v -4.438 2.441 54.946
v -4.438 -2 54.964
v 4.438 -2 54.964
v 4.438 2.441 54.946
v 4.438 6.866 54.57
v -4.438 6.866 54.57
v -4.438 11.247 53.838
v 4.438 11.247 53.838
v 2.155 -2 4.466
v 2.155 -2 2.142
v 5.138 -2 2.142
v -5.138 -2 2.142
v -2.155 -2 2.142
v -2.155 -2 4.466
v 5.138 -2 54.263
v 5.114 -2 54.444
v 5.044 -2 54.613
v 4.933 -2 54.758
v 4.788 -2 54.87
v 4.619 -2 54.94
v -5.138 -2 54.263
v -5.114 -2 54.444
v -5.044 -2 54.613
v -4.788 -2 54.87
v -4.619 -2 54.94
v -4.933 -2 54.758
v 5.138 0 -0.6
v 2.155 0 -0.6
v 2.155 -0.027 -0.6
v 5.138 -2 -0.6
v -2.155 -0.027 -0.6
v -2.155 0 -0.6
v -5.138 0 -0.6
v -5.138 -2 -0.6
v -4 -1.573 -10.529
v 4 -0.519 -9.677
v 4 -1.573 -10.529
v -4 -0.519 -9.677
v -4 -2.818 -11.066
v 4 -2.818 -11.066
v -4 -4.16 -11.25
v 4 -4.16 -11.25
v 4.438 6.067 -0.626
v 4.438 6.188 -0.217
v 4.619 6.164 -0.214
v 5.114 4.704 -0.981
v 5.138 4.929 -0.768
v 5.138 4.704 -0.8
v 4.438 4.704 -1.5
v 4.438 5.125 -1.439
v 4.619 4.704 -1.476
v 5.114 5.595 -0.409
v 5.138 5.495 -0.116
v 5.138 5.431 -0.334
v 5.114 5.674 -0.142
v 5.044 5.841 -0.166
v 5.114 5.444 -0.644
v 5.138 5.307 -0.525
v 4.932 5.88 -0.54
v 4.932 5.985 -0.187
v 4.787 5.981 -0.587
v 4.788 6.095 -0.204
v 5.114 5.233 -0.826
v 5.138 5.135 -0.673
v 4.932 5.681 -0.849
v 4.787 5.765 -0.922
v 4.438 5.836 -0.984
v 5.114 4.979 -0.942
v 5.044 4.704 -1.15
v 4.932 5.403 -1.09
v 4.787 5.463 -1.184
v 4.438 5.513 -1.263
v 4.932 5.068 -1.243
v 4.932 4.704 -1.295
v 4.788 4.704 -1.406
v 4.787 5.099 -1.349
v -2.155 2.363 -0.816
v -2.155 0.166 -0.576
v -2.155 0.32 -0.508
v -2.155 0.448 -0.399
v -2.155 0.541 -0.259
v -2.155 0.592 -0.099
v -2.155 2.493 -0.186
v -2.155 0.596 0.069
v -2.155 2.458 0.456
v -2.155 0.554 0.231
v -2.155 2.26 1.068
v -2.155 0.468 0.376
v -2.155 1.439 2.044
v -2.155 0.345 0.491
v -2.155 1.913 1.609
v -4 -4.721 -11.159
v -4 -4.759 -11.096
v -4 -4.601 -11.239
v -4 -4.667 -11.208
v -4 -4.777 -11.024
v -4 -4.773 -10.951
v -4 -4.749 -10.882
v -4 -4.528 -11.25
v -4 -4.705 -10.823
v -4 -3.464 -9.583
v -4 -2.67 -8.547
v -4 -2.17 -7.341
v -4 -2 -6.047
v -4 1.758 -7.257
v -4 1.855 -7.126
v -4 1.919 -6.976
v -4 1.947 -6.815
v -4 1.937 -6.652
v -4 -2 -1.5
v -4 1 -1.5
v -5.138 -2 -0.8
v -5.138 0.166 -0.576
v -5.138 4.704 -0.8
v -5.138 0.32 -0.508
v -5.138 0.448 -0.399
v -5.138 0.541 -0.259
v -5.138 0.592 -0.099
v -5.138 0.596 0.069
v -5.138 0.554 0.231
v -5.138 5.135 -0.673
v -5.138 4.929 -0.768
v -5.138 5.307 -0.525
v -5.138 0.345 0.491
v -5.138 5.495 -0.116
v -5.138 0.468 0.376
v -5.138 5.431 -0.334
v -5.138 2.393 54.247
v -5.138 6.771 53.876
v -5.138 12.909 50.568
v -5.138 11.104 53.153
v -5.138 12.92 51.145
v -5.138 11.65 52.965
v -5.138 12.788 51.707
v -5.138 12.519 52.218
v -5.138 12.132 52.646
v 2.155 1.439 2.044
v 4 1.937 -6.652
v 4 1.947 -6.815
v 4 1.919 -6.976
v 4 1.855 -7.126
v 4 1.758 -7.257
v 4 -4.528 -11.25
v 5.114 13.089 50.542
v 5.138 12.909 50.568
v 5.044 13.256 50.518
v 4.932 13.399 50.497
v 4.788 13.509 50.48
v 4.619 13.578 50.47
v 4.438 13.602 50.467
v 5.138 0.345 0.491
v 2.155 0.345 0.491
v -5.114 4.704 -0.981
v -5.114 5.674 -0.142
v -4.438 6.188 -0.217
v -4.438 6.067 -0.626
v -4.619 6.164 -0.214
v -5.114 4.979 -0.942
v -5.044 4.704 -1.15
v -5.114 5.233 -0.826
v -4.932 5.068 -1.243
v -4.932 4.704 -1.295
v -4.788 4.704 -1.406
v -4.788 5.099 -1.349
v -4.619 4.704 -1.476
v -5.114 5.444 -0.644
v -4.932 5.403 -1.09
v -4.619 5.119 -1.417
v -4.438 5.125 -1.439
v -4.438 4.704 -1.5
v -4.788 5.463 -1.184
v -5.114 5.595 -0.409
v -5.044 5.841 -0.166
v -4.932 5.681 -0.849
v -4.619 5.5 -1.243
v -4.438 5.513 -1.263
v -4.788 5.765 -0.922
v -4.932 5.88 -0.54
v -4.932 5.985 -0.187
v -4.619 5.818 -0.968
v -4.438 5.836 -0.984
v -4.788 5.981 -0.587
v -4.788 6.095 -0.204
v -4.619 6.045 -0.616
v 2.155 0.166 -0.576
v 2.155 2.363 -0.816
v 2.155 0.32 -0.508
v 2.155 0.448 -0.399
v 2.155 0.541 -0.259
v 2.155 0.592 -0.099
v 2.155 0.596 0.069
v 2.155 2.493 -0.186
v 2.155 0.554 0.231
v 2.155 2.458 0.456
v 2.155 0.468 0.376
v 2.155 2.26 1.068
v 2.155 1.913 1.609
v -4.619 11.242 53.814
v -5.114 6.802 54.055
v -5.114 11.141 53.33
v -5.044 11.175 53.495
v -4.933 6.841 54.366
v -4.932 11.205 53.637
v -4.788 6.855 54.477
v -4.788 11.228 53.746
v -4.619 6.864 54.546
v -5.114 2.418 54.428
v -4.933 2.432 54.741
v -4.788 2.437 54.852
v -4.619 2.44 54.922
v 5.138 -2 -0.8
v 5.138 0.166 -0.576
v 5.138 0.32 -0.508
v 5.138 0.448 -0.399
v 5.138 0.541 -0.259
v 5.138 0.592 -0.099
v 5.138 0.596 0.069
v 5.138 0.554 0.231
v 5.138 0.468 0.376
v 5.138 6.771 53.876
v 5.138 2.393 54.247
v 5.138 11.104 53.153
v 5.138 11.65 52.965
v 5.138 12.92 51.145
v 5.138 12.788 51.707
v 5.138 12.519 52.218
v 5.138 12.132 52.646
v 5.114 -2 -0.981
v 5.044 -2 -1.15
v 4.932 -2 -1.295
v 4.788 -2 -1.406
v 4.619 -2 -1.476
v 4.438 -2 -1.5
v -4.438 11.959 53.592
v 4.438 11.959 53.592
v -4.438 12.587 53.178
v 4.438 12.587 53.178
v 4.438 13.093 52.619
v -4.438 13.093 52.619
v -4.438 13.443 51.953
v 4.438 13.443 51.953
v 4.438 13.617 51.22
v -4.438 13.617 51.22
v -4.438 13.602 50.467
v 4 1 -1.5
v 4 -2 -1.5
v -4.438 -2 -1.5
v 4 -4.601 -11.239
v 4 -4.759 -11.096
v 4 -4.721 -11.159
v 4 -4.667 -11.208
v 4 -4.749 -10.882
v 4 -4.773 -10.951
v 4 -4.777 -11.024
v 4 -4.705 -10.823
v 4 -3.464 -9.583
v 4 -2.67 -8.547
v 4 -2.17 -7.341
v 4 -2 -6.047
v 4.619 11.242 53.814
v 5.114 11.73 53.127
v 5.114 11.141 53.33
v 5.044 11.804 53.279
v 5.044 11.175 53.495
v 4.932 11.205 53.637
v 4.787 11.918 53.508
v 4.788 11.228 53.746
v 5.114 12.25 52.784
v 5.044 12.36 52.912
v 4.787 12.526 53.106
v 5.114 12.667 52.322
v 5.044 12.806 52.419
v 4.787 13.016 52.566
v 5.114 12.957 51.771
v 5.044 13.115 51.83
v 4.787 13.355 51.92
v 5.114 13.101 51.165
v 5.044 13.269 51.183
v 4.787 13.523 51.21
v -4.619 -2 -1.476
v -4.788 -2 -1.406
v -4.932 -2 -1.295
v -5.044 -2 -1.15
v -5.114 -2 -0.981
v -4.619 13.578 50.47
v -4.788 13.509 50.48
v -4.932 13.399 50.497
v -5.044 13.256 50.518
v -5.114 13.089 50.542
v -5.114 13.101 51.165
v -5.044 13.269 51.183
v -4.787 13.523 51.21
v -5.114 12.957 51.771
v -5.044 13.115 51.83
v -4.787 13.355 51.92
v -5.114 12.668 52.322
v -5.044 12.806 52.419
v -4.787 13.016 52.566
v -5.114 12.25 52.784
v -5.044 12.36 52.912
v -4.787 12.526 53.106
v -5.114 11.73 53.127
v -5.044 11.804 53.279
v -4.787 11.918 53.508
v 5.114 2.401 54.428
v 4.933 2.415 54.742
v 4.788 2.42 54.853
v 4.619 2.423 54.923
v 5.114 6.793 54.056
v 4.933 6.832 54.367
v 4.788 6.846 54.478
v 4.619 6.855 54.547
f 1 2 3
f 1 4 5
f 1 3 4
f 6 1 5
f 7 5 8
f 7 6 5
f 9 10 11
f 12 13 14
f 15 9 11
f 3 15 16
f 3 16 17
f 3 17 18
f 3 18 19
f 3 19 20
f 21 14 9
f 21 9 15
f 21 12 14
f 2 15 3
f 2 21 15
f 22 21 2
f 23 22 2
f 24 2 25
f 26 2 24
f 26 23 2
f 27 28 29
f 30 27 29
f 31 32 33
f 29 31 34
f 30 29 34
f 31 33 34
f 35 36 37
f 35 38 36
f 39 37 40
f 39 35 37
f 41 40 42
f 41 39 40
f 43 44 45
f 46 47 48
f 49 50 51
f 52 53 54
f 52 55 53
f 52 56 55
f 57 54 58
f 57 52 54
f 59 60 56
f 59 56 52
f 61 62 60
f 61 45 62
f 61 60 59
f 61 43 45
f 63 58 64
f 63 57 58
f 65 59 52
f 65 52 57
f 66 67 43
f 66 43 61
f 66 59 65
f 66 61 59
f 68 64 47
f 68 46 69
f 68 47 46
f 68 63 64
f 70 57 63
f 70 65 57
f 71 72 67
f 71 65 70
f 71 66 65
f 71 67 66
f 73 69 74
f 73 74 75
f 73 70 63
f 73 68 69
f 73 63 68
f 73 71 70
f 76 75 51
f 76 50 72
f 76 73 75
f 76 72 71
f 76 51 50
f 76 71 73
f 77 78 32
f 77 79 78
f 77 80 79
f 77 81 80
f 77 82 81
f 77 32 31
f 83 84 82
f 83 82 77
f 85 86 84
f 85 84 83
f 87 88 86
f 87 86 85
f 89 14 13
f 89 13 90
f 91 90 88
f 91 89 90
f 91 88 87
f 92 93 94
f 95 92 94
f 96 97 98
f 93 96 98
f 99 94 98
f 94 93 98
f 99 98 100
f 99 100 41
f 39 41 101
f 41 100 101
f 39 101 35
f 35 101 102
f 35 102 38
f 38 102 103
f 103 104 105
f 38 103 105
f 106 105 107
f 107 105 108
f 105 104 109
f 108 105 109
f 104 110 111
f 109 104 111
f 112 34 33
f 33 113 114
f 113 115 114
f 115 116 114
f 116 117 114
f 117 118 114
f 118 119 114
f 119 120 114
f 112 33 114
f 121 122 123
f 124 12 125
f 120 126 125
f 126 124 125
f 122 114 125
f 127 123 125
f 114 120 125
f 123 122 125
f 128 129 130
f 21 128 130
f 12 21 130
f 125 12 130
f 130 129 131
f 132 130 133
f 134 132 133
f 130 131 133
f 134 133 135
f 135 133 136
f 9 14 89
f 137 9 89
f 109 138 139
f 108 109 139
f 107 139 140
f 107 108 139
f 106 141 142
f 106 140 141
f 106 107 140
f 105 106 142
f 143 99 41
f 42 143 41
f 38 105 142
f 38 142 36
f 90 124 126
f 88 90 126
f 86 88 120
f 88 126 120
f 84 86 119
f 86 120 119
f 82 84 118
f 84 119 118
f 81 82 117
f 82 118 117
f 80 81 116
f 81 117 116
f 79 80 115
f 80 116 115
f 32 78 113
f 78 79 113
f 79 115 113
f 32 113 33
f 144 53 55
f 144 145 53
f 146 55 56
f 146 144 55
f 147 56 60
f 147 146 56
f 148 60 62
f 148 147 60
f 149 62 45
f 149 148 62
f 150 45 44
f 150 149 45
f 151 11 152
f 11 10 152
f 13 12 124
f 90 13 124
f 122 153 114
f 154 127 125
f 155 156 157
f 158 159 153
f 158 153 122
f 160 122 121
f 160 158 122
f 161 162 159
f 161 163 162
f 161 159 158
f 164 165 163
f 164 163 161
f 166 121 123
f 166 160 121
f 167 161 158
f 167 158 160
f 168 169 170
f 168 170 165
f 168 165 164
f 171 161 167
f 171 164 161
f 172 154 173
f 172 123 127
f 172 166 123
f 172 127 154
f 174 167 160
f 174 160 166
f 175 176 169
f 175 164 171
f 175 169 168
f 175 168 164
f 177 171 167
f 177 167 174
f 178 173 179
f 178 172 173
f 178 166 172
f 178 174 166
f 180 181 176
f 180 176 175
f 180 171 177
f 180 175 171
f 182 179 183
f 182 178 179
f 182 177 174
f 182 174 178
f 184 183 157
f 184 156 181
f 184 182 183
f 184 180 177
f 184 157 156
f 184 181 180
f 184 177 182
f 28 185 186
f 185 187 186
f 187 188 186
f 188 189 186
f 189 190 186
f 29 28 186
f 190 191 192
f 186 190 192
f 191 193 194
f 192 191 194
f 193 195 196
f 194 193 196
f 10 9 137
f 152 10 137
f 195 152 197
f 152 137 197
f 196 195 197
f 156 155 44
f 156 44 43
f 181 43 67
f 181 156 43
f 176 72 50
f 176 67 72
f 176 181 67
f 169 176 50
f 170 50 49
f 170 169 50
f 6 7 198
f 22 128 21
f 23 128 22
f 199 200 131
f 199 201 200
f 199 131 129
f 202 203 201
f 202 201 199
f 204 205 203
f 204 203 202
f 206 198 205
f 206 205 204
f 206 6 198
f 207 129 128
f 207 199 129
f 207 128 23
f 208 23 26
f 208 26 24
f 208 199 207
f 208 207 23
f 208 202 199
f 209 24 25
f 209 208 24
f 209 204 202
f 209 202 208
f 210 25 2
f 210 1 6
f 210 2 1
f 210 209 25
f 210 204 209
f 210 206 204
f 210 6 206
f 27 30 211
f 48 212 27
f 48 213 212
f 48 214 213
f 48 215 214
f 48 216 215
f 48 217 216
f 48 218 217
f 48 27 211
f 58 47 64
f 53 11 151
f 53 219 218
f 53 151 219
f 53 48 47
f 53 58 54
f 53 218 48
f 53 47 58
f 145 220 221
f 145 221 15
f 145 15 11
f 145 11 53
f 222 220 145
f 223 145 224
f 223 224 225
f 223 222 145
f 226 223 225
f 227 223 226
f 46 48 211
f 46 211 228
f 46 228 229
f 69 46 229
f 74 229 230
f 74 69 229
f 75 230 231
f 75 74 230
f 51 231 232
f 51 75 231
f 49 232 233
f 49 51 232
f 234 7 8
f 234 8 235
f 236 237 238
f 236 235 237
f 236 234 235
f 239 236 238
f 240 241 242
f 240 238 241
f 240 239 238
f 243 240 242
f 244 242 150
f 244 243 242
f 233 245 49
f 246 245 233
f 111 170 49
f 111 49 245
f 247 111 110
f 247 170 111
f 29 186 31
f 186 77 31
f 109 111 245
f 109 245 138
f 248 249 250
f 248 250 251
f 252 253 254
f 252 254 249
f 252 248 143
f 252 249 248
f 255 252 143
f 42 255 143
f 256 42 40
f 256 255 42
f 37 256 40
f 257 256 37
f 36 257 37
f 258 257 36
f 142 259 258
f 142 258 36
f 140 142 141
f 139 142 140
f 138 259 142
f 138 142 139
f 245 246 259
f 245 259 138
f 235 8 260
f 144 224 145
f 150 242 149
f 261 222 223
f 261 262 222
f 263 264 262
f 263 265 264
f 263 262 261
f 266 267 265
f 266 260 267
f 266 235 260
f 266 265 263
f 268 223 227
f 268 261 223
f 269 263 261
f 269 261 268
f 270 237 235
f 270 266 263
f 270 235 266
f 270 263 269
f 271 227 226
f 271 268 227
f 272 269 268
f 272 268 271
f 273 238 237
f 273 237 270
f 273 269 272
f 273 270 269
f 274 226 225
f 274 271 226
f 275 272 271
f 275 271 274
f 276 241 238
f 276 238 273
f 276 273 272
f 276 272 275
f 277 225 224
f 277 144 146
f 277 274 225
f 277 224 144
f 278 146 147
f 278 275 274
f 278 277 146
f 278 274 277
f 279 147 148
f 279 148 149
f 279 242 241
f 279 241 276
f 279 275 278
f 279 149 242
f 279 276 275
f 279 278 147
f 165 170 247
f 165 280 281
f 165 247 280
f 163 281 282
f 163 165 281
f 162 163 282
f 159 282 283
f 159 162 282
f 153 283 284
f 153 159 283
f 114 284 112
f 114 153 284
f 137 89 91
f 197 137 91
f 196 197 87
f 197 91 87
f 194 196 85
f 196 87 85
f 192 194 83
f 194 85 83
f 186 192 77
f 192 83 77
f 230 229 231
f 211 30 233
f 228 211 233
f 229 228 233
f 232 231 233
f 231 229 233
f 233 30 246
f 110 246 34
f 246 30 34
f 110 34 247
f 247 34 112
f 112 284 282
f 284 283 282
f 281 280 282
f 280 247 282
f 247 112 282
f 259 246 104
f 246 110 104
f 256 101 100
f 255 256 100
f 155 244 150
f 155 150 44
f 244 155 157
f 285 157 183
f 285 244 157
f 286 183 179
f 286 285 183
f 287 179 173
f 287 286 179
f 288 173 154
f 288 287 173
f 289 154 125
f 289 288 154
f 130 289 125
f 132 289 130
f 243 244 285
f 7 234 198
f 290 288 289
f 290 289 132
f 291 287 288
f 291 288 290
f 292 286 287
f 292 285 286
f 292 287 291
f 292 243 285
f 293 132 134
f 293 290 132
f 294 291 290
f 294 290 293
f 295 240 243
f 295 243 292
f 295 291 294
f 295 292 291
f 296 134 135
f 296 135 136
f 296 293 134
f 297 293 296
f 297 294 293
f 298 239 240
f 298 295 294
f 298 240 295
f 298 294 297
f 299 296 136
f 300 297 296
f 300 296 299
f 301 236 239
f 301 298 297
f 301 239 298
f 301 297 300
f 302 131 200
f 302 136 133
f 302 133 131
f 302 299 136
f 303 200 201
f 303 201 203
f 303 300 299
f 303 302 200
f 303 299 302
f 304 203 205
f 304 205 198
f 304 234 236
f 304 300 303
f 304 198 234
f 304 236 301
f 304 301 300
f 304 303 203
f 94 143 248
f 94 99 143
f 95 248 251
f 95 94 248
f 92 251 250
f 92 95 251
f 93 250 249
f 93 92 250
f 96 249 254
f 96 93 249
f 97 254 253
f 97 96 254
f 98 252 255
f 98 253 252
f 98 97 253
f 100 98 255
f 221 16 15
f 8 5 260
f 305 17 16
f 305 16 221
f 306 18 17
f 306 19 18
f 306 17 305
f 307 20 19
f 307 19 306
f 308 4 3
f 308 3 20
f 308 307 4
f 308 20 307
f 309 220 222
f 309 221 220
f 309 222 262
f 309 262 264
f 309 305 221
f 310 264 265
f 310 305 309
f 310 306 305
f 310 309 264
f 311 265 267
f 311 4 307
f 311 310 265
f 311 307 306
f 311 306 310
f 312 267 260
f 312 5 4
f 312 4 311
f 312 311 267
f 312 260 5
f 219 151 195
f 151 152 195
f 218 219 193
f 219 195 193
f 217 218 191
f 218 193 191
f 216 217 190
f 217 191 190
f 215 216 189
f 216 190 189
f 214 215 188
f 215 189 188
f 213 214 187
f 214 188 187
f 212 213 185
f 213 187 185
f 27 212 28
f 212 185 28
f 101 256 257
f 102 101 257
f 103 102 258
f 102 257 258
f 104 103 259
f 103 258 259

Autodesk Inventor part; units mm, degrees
ref_plane "YZ Plane" through (0, 0, 0) normal (1, 0, 0) x (0, 1, 0)
ref_plane "XZ Plane" through (0, 0, 0) normal (0, 1, 0) x (-1, 0, 0)
ref_plane "XY Plane" through (0, 0, 0) normal (0, 0, 1) x (1, 0, 0)
sketch "Profile Sketch" plane through (0, 0, 0) normal (1, 0, 0) x (0, 1, 0)
  line L0 (-2, 2.1422) -> (-2, 54.9636)
  arc A0 (11.247, 53.8378) -> (-2, 54.9636) centre (0, 0) ccw
  line L1 (13.6019, 50.4669) -> (6.1877, -0.2171)
  line L2 (-2, 2.1422) -> (0.3454, 0.4906)
  arc A1 (0, -0.6) -> (0.3454, 0.4906) centre (0, 0) ccw
  line L3 (0, -0.6) -> (-2, -0.6)
  line L4 (-2, -0.6) -> (-2, -8.1183)
  line L5 (-2, -8.1183) -> (-4.7049, -10.8232)
  line L6 (-4.7781, -11.25) -> (-2, -11.25)
  line L7 (4.7035, -1.5) -> (1.4679, -1.5)
  line L8 (1, -1.5) -> (2, -7)
  line L9 (2, -7) -> (-2, -11.25)
  line L10 (-2, 4.4659) -> (1.4394, 2.0441)
  arc A2 (2.3633, -0.8155) -> (1.4394, 2.0441) centre (0, 0) ccw
  line L11 (2.3633, -0.8155) -> (-0.027, -0.6)
  arc A3 (4.7035, -1.5) -> (6.1877, -0.2171) centre (4.7035, 0) ccw
  arc A4 (13.6019, 50.4669) -> (11.247, 53.8378) centre (10.6335, 50.9012) ccw
  line L12 (4.7035, 0) -> (0, 0) construction
  line L13 (1.4679, -1.5) -> (-2, -1.5)
  arc A5 (-4.7049, -10.8232) -> (-4.5281, -11.25) centre (-4.5281, -11) ccw
  line L14 (-4.7781, -11.25) -> (-4.7781, -11) construction
  point P0 (14, 53.1883)
  point P1 (6, -1.5)
  dimension "d0" = 0.6
  dimension "d2" = 45
  dimension "d4" = 55
  dimension "d7" = 54.848
  dimension "d8" = 2.5
  dimension "d9" = 5.152
  dimension "d10" = 2
  dimension "d11" = 16
  dimension "d12" = 8
  dimension "d13" = 1.5
  dimension "d14" = 3
  dimension "d20" = 2.7781
  dimension "d26" = 11
  dimension "d27" = 0.25
  dimension "d28" = 7
  dimension "d30" = 1
  dimension "d31" = 3
extrude "Main Key" add sketch "Profile Sketch" along normal mid plane 10.275 contours L0 L10 A2 L11 L3 A1 L2 | L0 A0 A4 L1 A3 L7 L13 L4 L3 L11 A2 L10
extrude "Extrusion2" add sketch "Profile Sketch" along normal mid plane 8 contours L13 L8 L9 L6 A5 L5 L4
fillet "Fillet1" radius 0.7 10 edges at (-5.1375, 5.6844, -1.1348) (-5.1375, 1.3517, -1.5) (-5.1375, 13.0928, 52.6193) (-5.1375, 4.6576, 54.8024) (-5.1375, 9.8948, 25.1249) (5.1375, 13.0928, 52.6193) (5.1375, 4.6576, 54.8024) (5.1375, 5.6844, -1.1348) (5.1375, 1.3517, -1.5) (5.1375, 9.8948, 25.1249)
extrude "Extrusion3" cut sketch "Profile Sketch" along normal mid plane 4.31 contours L0 L10 A2 L11 L3 A1 L2
fillet "Fillet2" radius 5 2 edges at (0, -2, -8.1183) (0, -2, -11.25)
fillet "Fillet3" radius 0.7 1 edges at (0, 2, -7)
equation "\"d0\" = hingeSocketRad"
equation "\"d4\" = blackKeyLength"
equation "\"hingeSocketRad\" = 0.6"
equation "\"blackKeyLength\" = 55"
properties part number "black_key" material "PLA (Black, 3D Printed)"
